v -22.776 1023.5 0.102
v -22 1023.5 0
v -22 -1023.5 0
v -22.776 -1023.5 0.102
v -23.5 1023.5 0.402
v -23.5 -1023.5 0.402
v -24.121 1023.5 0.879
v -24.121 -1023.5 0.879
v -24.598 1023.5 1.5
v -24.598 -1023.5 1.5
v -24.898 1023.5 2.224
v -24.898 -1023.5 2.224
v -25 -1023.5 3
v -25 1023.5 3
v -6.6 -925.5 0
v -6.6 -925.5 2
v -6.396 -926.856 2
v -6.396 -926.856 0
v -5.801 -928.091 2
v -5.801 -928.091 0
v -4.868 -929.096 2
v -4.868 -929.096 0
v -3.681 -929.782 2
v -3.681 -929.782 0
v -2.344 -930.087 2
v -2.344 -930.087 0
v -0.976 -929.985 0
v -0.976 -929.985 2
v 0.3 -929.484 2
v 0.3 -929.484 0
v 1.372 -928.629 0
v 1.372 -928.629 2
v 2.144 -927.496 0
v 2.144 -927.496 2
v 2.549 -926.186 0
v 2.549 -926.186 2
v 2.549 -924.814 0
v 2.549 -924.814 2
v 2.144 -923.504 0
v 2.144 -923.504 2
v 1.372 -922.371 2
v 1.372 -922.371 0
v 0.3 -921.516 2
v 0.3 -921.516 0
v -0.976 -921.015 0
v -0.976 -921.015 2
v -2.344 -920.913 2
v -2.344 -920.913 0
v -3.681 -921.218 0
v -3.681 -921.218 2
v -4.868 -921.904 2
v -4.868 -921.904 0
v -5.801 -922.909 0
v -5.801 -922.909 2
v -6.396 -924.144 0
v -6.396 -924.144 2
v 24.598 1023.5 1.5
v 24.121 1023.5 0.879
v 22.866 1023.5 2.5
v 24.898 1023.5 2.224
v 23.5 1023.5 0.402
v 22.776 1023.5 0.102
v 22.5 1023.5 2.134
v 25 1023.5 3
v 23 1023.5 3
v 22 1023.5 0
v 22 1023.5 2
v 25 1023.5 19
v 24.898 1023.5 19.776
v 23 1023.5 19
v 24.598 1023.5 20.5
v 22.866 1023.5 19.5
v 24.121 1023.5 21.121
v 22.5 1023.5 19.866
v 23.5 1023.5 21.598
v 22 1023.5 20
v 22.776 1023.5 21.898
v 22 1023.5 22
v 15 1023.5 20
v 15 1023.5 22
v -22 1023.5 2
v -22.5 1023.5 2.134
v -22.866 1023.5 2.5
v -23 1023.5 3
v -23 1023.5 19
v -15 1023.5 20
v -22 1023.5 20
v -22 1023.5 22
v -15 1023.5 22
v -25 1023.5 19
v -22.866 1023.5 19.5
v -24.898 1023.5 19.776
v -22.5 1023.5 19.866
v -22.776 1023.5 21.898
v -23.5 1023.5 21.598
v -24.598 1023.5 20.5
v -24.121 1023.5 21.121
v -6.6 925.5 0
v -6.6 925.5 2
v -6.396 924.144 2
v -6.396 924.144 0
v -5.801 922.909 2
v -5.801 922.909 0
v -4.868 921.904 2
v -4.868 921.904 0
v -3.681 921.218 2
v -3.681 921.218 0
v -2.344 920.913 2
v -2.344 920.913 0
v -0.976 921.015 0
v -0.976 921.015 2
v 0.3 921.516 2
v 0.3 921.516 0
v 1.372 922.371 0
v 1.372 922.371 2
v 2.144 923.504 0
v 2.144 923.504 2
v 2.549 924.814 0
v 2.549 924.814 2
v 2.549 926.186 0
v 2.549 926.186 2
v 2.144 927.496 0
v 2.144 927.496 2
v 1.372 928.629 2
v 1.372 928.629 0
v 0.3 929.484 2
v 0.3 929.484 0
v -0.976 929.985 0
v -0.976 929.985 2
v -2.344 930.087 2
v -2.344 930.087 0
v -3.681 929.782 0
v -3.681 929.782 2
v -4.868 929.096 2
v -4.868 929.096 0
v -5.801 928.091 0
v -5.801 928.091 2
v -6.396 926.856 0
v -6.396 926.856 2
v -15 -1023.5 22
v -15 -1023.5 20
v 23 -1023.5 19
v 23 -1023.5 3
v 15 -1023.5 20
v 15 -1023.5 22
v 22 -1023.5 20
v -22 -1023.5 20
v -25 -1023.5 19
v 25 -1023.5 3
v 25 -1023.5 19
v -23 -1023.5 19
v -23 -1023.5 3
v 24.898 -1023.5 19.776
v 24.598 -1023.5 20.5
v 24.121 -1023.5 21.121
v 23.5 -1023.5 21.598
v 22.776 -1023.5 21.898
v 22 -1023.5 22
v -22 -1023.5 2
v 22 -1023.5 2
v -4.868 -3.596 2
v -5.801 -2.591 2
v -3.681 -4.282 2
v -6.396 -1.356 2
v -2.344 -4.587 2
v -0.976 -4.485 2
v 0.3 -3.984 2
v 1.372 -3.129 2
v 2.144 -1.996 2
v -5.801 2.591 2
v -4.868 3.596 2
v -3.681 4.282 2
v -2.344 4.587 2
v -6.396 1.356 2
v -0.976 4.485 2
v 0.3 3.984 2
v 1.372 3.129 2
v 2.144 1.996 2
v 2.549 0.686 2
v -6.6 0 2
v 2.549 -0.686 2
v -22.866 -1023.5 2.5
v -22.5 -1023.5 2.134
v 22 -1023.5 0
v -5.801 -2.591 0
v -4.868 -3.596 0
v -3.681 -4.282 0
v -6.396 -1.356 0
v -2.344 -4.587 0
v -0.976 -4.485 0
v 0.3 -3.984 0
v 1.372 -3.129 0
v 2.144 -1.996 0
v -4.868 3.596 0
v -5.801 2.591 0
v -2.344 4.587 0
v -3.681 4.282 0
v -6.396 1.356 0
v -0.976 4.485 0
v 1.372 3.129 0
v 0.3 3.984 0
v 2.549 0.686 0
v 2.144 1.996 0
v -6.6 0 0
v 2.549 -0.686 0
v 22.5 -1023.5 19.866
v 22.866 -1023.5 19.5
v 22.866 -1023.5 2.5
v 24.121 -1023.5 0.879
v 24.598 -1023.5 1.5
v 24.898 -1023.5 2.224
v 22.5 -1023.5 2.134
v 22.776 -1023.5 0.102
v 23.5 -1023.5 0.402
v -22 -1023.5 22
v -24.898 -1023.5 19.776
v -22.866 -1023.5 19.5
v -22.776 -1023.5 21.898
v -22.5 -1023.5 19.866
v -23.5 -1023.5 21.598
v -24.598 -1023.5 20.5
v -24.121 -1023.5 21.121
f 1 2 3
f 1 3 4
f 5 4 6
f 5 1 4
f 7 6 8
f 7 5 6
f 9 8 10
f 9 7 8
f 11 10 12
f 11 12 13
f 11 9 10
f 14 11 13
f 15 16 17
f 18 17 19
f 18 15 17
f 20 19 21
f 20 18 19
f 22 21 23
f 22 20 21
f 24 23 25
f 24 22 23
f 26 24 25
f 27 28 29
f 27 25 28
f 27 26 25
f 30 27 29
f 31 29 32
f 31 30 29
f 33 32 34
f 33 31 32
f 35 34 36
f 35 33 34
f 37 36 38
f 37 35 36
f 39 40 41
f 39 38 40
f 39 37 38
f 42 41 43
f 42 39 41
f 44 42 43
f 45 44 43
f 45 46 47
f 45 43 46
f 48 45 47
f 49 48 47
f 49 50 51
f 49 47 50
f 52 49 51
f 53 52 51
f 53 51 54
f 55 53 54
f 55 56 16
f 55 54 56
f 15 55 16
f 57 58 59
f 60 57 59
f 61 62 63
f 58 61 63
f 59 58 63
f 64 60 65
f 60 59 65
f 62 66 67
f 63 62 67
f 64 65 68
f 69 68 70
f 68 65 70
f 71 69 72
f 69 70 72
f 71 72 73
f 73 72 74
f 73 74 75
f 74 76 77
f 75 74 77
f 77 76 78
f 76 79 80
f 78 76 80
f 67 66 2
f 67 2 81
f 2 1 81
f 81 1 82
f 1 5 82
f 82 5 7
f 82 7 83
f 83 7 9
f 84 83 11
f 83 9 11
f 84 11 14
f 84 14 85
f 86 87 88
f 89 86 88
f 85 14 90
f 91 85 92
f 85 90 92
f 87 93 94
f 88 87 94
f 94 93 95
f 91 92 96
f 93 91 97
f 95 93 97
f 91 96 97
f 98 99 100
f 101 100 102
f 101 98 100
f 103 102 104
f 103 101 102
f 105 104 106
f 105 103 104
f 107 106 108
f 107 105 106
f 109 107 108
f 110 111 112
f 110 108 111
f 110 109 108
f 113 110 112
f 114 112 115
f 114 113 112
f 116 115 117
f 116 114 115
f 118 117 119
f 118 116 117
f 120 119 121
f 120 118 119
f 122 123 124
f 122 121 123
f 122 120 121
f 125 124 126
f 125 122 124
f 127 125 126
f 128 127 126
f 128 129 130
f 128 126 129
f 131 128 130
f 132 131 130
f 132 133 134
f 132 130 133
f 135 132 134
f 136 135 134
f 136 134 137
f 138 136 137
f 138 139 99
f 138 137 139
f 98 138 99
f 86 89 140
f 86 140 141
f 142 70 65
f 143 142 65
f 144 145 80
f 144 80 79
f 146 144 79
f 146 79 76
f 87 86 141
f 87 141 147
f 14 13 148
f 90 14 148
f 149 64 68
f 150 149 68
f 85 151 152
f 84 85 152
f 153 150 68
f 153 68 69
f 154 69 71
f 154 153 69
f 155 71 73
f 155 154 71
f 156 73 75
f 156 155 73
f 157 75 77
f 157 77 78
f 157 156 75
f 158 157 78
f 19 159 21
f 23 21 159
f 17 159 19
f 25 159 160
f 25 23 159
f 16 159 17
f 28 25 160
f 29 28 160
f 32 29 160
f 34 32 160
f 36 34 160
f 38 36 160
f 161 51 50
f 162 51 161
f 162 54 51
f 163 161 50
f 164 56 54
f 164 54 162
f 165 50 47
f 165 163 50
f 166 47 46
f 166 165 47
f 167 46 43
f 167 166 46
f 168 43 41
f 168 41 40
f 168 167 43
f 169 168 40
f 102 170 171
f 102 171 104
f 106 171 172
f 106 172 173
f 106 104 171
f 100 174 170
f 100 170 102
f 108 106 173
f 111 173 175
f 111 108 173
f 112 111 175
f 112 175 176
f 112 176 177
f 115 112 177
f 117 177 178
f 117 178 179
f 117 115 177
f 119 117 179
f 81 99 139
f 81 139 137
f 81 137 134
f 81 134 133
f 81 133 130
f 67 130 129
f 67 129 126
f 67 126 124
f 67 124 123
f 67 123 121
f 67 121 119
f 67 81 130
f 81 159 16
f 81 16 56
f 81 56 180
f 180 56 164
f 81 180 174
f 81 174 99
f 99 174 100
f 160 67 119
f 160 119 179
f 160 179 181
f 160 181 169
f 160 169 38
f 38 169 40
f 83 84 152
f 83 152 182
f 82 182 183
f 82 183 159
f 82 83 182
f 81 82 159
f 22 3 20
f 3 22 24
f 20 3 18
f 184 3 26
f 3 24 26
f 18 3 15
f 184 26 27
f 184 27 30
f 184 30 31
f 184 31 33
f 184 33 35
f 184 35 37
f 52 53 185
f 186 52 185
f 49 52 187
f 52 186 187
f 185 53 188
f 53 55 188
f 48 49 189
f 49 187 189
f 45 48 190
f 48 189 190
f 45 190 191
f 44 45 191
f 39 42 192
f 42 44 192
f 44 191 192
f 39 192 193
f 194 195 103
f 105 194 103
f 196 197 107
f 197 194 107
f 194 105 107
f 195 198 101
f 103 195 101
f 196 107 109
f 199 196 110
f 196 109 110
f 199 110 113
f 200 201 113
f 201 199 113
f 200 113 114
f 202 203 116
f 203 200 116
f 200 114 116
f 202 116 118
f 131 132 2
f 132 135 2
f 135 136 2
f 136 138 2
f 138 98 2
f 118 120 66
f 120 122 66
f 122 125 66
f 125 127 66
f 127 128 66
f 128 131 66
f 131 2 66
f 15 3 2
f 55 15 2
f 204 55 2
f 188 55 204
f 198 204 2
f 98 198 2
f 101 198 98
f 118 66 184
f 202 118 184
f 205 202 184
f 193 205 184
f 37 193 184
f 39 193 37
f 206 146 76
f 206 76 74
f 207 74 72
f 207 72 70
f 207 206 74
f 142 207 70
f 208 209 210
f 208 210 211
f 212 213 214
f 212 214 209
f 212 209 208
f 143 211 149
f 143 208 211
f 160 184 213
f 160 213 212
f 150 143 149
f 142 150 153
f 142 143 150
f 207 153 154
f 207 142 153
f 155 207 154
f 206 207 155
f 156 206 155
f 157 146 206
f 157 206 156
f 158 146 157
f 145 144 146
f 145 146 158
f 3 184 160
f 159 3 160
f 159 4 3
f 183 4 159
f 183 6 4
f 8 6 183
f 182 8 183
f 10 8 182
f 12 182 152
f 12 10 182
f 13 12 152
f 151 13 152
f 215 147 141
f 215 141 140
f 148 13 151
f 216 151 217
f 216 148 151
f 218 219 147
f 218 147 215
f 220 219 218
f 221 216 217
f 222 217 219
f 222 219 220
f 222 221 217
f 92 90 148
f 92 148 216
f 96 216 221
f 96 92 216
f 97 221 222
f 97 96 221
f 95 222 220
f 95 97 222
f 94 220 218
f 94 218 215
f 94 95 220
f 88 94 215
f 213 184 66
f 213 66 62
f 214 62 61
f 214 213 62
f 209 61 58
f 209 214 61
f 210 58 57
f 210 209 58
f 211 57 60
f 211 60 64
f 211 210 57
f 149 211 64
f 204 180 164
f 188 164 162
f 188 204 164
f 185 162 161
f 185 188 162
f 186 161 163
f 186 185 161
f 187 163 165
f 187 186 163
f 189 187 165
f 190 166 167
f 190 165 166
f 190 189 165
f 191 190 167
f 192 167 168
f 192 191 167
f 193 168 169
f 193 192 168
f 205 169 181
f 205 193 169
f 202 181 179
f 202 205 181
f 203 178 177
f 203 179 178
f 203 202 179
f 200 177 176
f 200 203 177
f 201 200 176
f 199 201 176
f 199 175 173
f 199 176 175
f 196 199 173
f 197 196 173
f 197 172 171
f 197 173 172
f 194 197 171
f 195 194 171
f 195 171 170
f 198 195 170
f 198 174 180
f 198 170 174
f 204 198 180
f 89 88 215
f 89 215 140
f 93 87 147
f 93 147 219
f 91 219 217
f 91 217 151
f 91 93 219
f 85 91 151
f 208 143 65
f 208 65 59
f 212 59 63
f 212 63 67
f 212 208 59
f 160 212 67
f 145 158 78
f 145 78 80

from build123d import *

# Parameters (mm, degrees)
BASEFLANGE_W                   = 50
BASEFLANGE_H                   = 2047
BASE_FLANGE1_DEPTH             = 2
EDGE_FLANGE1_STRIP_W           = 10
EDGE_FLANGE1_STRIP_H           = 2
EDGE_FLANGE1_STRIP_CUT_DEPTH   = 2047
EDGE_FLANGE1_STRIP_2_W         = 10
EDGE_FLANGE1_STRIP_2_H         = 2
EDGE_FLANGE1_STRIP_CUT_2_DEPTH = 2047
EDGE_FLANGE1_DEPTH             = 2047
EDGE_FLANGE1_BEND_DEPTH        = 2047
EDGE_FLANGE2_STRIP_W           = 10
EDGE_FLANGE2_STRIP_H           = 2
EDGE_FLANGE2_STRIP_CUT_DEPTH   = 2047
EDGE_FLANGE2_STRIP_2_W         = 10
EDGE_FLANGE2_STRIP_2_H         = 2
EDGE_FLANGE2_STRIP_CUT_2_DEPTH = 2047
EDGE_FLANGE2_DEPTH             = 2047
EDGE_FLANGE2_BEND_DEPTH        = 2047
HINGEHOLES_R                   = 4.6
CUT_EXTRUDE1_DEPTH             = 1025.041625131


# Sheet-metal steps are written as plain solids
with BuildPart() as part:
    # BaseFlange → Base-Flange1 (new body)
    with BuildSketch(Plane.XY):
        Rectangle(BASEFLANGE_W, BASEFLANGE_H)
    extrude(amount=BASE_FLANGE1_DEPTH)

    # Edge-Flange1 strip (across the edge) → Edge-Flange1 strip cut (cut)
    with BuildSketch(Plane(origin=(25, -1023.5, 2), x_dir=(-1, 0, 0), z_dir=(0, 1, 0))):
        with Locations((-2, -1)):
            Rectangle(EDGE_FLANGE1_STRIP_W, EDGE_FLANGE1_STRIP_H)
    extrude(amount=EDGE_FLANGE1_STRIP_CUT_DEPTH, mode=Mode.SUBTRACT)

    # Edge-Flange1 strip 2 (across the edge) → Edge-Flange1 strip cut 2 (cut)
    with BuildSketch(Plane(origin=(-25, 1023.5, 2), x_dir=(1, 0, 0), z_dir=(0, -1, 0))):
        with Locations((-2, -1)):
            Rectangle(EDGE_FLANGE1_STRIP_2_W, EDGE_FLANGE1_STRIP_2_H)
    extrude(amount=EDGE_FLANGE1_STRIP_CUT_2_DEPTH, mode=Mode.SUBTRACT)

    # Edge-Flange1 section (across the edge) → Edge-Flange1 (add)
    with BuildSketch(Plane(origin=(25, -1023.5, 2), x_dir=(-1, 0, 0), z_dir=(0, 1, 0))):
        with BuildLine():
            Line((0, 1), (0, 20))
            Line((0, 20), (2, 20))
            Line((2, 20), (2, 1))
            ThreePointArc((2, 1), (2.292893219, 0.292893219), (3, 0))
            Line((3, 0), (3, -2))
            ThreePointArc((3, -2), (0.878679656, -1.121320344), (0, 1))
        make_face()
    extrude(amount=EDGE_FLANGE1_DEPTH)

    # Edge-Flange1 section 2 (across the edge) → Edge-Flange1 bend (add)
    with BuildSketch(Plane(origin=(-25, 1023.5, 2), x_dir=(1, 0, 0), z_dir=(0, -1, 0))):
        with BuildLine():
            Line((0, 1), (0, 20))
            Line((0, 20), (2, 20))
            Line((2, 20), (2, 1))
            ThreePointArc((2, 1), (2.292893219, 0.292893219), (3, 0))
            Line((3, 0), (3, -2))
            ThreePointArc((3, -2), (0.878679656, -1.121320344), (0, 1))
        make_face()
    extrude(amount=EDGE_FLANGE1_BEND_DEPTH)

    # Edge-Flange2 strip (across the edge) → Edge-Flange2 strip cut (cut)
    with BuildSketch(Plane(origin=(-23, 1023.5, 22), x_dir=(0, 0, -1), z_dir=(0, -1, 0))):
        with Locations((-2, -1)):
            Rectangle(EDGE_FLANGE2_STRIP_W, EDGE_FLANGE2_STRIP_H)
    extrude(amount=EDGE_FLANGE2_STRIP_CUT_DEPTH, mode=Mode.SUBTRACT)

    # Edge-Flange2 strip 2 (across the edge) → Edge-Flange2 strip cut 2 (cut)
    with BuildSketch(Plane(origin=(23, -1023.5, 22), x_dir=(0, 0, -1), z_dir=(0, 1, 0))):
        with Locations((-2, -1)):
            Rectangle(EDGE_FLANGE2_STRIP_2_W, EDGE_FLANGE2_STRIP_2_H)
    extrude(amount=EDGE_FLANGE2_STRIP_CUT_2_DEPTH, mode=Mode.SUBTRACT)

    # Edge-Flange2 section (across the edge) → Edge-Flange2 (add)
    with BuildSketch(Plane(origin=(-23, 1023.5, 22), x_dir=(0, 0, -1), z_dir=(0, -1, 0))):
        with BuildLine():
            Line((0, 1), (0, 8))
            Line((0, 8), (2, 8))
            Line((2, 8), (2, 1))
            ThreePointArc((2, 1), (2.292893219, 0.292893219), (3, 0))
            Line((3, 0), (3, -2))
            ThreePointArc((3, -2), (0.878679656, -1.121320344), (0, 1))
        make_face()
    extrude(amount=EDGE_FLANGE2_DEPTH)

    # Edge-Flange2 section 2 (across the edge) → Edge-Flange2 bend (add)
    with BuildSketch(Plane(origin=(23, -1023.5, 22), x_dir=(0, 0, -1), z_dir=(0, 1, 0))):
        with BuildLine():
            Line((0, 1), (0, 8))
            Line((0, 8), (2, 8))
            Line((2, 8), (2, 1))
            ThreePointArc((2, 1), (2.292893219, 0.292893219), (3, 0))
            Line((3, 0), (3, -2))
            ThreePointArc((3, -2), (0.878679656, -1.121320344), (0, 1))
        make_face()
    extrude(amount=EDGE_FLANGE2_BEND_DEPTH)

    # HingeHoles → Cut-Extrude1 (cut, through all)
    with BuildSketch(Plane.XY):
        with Locations(Location((-2, 925.5, 0), (0, 0, 180))):
            Circle(HINGEHOLES_R)
        with Locations(Location((-2, 0, 0), (0, 0, 180))):
            Circle(HINGEHOLES_R)
        with Locations(Location((-2, -925.5, 0), (0, 0, 180))):
            Circle(HINGEHOLES_R)
    extrude(amount=CUT_EXTRUDE1_DEPTH, mode=Mode.SUBTRACT)


solid = part.part
